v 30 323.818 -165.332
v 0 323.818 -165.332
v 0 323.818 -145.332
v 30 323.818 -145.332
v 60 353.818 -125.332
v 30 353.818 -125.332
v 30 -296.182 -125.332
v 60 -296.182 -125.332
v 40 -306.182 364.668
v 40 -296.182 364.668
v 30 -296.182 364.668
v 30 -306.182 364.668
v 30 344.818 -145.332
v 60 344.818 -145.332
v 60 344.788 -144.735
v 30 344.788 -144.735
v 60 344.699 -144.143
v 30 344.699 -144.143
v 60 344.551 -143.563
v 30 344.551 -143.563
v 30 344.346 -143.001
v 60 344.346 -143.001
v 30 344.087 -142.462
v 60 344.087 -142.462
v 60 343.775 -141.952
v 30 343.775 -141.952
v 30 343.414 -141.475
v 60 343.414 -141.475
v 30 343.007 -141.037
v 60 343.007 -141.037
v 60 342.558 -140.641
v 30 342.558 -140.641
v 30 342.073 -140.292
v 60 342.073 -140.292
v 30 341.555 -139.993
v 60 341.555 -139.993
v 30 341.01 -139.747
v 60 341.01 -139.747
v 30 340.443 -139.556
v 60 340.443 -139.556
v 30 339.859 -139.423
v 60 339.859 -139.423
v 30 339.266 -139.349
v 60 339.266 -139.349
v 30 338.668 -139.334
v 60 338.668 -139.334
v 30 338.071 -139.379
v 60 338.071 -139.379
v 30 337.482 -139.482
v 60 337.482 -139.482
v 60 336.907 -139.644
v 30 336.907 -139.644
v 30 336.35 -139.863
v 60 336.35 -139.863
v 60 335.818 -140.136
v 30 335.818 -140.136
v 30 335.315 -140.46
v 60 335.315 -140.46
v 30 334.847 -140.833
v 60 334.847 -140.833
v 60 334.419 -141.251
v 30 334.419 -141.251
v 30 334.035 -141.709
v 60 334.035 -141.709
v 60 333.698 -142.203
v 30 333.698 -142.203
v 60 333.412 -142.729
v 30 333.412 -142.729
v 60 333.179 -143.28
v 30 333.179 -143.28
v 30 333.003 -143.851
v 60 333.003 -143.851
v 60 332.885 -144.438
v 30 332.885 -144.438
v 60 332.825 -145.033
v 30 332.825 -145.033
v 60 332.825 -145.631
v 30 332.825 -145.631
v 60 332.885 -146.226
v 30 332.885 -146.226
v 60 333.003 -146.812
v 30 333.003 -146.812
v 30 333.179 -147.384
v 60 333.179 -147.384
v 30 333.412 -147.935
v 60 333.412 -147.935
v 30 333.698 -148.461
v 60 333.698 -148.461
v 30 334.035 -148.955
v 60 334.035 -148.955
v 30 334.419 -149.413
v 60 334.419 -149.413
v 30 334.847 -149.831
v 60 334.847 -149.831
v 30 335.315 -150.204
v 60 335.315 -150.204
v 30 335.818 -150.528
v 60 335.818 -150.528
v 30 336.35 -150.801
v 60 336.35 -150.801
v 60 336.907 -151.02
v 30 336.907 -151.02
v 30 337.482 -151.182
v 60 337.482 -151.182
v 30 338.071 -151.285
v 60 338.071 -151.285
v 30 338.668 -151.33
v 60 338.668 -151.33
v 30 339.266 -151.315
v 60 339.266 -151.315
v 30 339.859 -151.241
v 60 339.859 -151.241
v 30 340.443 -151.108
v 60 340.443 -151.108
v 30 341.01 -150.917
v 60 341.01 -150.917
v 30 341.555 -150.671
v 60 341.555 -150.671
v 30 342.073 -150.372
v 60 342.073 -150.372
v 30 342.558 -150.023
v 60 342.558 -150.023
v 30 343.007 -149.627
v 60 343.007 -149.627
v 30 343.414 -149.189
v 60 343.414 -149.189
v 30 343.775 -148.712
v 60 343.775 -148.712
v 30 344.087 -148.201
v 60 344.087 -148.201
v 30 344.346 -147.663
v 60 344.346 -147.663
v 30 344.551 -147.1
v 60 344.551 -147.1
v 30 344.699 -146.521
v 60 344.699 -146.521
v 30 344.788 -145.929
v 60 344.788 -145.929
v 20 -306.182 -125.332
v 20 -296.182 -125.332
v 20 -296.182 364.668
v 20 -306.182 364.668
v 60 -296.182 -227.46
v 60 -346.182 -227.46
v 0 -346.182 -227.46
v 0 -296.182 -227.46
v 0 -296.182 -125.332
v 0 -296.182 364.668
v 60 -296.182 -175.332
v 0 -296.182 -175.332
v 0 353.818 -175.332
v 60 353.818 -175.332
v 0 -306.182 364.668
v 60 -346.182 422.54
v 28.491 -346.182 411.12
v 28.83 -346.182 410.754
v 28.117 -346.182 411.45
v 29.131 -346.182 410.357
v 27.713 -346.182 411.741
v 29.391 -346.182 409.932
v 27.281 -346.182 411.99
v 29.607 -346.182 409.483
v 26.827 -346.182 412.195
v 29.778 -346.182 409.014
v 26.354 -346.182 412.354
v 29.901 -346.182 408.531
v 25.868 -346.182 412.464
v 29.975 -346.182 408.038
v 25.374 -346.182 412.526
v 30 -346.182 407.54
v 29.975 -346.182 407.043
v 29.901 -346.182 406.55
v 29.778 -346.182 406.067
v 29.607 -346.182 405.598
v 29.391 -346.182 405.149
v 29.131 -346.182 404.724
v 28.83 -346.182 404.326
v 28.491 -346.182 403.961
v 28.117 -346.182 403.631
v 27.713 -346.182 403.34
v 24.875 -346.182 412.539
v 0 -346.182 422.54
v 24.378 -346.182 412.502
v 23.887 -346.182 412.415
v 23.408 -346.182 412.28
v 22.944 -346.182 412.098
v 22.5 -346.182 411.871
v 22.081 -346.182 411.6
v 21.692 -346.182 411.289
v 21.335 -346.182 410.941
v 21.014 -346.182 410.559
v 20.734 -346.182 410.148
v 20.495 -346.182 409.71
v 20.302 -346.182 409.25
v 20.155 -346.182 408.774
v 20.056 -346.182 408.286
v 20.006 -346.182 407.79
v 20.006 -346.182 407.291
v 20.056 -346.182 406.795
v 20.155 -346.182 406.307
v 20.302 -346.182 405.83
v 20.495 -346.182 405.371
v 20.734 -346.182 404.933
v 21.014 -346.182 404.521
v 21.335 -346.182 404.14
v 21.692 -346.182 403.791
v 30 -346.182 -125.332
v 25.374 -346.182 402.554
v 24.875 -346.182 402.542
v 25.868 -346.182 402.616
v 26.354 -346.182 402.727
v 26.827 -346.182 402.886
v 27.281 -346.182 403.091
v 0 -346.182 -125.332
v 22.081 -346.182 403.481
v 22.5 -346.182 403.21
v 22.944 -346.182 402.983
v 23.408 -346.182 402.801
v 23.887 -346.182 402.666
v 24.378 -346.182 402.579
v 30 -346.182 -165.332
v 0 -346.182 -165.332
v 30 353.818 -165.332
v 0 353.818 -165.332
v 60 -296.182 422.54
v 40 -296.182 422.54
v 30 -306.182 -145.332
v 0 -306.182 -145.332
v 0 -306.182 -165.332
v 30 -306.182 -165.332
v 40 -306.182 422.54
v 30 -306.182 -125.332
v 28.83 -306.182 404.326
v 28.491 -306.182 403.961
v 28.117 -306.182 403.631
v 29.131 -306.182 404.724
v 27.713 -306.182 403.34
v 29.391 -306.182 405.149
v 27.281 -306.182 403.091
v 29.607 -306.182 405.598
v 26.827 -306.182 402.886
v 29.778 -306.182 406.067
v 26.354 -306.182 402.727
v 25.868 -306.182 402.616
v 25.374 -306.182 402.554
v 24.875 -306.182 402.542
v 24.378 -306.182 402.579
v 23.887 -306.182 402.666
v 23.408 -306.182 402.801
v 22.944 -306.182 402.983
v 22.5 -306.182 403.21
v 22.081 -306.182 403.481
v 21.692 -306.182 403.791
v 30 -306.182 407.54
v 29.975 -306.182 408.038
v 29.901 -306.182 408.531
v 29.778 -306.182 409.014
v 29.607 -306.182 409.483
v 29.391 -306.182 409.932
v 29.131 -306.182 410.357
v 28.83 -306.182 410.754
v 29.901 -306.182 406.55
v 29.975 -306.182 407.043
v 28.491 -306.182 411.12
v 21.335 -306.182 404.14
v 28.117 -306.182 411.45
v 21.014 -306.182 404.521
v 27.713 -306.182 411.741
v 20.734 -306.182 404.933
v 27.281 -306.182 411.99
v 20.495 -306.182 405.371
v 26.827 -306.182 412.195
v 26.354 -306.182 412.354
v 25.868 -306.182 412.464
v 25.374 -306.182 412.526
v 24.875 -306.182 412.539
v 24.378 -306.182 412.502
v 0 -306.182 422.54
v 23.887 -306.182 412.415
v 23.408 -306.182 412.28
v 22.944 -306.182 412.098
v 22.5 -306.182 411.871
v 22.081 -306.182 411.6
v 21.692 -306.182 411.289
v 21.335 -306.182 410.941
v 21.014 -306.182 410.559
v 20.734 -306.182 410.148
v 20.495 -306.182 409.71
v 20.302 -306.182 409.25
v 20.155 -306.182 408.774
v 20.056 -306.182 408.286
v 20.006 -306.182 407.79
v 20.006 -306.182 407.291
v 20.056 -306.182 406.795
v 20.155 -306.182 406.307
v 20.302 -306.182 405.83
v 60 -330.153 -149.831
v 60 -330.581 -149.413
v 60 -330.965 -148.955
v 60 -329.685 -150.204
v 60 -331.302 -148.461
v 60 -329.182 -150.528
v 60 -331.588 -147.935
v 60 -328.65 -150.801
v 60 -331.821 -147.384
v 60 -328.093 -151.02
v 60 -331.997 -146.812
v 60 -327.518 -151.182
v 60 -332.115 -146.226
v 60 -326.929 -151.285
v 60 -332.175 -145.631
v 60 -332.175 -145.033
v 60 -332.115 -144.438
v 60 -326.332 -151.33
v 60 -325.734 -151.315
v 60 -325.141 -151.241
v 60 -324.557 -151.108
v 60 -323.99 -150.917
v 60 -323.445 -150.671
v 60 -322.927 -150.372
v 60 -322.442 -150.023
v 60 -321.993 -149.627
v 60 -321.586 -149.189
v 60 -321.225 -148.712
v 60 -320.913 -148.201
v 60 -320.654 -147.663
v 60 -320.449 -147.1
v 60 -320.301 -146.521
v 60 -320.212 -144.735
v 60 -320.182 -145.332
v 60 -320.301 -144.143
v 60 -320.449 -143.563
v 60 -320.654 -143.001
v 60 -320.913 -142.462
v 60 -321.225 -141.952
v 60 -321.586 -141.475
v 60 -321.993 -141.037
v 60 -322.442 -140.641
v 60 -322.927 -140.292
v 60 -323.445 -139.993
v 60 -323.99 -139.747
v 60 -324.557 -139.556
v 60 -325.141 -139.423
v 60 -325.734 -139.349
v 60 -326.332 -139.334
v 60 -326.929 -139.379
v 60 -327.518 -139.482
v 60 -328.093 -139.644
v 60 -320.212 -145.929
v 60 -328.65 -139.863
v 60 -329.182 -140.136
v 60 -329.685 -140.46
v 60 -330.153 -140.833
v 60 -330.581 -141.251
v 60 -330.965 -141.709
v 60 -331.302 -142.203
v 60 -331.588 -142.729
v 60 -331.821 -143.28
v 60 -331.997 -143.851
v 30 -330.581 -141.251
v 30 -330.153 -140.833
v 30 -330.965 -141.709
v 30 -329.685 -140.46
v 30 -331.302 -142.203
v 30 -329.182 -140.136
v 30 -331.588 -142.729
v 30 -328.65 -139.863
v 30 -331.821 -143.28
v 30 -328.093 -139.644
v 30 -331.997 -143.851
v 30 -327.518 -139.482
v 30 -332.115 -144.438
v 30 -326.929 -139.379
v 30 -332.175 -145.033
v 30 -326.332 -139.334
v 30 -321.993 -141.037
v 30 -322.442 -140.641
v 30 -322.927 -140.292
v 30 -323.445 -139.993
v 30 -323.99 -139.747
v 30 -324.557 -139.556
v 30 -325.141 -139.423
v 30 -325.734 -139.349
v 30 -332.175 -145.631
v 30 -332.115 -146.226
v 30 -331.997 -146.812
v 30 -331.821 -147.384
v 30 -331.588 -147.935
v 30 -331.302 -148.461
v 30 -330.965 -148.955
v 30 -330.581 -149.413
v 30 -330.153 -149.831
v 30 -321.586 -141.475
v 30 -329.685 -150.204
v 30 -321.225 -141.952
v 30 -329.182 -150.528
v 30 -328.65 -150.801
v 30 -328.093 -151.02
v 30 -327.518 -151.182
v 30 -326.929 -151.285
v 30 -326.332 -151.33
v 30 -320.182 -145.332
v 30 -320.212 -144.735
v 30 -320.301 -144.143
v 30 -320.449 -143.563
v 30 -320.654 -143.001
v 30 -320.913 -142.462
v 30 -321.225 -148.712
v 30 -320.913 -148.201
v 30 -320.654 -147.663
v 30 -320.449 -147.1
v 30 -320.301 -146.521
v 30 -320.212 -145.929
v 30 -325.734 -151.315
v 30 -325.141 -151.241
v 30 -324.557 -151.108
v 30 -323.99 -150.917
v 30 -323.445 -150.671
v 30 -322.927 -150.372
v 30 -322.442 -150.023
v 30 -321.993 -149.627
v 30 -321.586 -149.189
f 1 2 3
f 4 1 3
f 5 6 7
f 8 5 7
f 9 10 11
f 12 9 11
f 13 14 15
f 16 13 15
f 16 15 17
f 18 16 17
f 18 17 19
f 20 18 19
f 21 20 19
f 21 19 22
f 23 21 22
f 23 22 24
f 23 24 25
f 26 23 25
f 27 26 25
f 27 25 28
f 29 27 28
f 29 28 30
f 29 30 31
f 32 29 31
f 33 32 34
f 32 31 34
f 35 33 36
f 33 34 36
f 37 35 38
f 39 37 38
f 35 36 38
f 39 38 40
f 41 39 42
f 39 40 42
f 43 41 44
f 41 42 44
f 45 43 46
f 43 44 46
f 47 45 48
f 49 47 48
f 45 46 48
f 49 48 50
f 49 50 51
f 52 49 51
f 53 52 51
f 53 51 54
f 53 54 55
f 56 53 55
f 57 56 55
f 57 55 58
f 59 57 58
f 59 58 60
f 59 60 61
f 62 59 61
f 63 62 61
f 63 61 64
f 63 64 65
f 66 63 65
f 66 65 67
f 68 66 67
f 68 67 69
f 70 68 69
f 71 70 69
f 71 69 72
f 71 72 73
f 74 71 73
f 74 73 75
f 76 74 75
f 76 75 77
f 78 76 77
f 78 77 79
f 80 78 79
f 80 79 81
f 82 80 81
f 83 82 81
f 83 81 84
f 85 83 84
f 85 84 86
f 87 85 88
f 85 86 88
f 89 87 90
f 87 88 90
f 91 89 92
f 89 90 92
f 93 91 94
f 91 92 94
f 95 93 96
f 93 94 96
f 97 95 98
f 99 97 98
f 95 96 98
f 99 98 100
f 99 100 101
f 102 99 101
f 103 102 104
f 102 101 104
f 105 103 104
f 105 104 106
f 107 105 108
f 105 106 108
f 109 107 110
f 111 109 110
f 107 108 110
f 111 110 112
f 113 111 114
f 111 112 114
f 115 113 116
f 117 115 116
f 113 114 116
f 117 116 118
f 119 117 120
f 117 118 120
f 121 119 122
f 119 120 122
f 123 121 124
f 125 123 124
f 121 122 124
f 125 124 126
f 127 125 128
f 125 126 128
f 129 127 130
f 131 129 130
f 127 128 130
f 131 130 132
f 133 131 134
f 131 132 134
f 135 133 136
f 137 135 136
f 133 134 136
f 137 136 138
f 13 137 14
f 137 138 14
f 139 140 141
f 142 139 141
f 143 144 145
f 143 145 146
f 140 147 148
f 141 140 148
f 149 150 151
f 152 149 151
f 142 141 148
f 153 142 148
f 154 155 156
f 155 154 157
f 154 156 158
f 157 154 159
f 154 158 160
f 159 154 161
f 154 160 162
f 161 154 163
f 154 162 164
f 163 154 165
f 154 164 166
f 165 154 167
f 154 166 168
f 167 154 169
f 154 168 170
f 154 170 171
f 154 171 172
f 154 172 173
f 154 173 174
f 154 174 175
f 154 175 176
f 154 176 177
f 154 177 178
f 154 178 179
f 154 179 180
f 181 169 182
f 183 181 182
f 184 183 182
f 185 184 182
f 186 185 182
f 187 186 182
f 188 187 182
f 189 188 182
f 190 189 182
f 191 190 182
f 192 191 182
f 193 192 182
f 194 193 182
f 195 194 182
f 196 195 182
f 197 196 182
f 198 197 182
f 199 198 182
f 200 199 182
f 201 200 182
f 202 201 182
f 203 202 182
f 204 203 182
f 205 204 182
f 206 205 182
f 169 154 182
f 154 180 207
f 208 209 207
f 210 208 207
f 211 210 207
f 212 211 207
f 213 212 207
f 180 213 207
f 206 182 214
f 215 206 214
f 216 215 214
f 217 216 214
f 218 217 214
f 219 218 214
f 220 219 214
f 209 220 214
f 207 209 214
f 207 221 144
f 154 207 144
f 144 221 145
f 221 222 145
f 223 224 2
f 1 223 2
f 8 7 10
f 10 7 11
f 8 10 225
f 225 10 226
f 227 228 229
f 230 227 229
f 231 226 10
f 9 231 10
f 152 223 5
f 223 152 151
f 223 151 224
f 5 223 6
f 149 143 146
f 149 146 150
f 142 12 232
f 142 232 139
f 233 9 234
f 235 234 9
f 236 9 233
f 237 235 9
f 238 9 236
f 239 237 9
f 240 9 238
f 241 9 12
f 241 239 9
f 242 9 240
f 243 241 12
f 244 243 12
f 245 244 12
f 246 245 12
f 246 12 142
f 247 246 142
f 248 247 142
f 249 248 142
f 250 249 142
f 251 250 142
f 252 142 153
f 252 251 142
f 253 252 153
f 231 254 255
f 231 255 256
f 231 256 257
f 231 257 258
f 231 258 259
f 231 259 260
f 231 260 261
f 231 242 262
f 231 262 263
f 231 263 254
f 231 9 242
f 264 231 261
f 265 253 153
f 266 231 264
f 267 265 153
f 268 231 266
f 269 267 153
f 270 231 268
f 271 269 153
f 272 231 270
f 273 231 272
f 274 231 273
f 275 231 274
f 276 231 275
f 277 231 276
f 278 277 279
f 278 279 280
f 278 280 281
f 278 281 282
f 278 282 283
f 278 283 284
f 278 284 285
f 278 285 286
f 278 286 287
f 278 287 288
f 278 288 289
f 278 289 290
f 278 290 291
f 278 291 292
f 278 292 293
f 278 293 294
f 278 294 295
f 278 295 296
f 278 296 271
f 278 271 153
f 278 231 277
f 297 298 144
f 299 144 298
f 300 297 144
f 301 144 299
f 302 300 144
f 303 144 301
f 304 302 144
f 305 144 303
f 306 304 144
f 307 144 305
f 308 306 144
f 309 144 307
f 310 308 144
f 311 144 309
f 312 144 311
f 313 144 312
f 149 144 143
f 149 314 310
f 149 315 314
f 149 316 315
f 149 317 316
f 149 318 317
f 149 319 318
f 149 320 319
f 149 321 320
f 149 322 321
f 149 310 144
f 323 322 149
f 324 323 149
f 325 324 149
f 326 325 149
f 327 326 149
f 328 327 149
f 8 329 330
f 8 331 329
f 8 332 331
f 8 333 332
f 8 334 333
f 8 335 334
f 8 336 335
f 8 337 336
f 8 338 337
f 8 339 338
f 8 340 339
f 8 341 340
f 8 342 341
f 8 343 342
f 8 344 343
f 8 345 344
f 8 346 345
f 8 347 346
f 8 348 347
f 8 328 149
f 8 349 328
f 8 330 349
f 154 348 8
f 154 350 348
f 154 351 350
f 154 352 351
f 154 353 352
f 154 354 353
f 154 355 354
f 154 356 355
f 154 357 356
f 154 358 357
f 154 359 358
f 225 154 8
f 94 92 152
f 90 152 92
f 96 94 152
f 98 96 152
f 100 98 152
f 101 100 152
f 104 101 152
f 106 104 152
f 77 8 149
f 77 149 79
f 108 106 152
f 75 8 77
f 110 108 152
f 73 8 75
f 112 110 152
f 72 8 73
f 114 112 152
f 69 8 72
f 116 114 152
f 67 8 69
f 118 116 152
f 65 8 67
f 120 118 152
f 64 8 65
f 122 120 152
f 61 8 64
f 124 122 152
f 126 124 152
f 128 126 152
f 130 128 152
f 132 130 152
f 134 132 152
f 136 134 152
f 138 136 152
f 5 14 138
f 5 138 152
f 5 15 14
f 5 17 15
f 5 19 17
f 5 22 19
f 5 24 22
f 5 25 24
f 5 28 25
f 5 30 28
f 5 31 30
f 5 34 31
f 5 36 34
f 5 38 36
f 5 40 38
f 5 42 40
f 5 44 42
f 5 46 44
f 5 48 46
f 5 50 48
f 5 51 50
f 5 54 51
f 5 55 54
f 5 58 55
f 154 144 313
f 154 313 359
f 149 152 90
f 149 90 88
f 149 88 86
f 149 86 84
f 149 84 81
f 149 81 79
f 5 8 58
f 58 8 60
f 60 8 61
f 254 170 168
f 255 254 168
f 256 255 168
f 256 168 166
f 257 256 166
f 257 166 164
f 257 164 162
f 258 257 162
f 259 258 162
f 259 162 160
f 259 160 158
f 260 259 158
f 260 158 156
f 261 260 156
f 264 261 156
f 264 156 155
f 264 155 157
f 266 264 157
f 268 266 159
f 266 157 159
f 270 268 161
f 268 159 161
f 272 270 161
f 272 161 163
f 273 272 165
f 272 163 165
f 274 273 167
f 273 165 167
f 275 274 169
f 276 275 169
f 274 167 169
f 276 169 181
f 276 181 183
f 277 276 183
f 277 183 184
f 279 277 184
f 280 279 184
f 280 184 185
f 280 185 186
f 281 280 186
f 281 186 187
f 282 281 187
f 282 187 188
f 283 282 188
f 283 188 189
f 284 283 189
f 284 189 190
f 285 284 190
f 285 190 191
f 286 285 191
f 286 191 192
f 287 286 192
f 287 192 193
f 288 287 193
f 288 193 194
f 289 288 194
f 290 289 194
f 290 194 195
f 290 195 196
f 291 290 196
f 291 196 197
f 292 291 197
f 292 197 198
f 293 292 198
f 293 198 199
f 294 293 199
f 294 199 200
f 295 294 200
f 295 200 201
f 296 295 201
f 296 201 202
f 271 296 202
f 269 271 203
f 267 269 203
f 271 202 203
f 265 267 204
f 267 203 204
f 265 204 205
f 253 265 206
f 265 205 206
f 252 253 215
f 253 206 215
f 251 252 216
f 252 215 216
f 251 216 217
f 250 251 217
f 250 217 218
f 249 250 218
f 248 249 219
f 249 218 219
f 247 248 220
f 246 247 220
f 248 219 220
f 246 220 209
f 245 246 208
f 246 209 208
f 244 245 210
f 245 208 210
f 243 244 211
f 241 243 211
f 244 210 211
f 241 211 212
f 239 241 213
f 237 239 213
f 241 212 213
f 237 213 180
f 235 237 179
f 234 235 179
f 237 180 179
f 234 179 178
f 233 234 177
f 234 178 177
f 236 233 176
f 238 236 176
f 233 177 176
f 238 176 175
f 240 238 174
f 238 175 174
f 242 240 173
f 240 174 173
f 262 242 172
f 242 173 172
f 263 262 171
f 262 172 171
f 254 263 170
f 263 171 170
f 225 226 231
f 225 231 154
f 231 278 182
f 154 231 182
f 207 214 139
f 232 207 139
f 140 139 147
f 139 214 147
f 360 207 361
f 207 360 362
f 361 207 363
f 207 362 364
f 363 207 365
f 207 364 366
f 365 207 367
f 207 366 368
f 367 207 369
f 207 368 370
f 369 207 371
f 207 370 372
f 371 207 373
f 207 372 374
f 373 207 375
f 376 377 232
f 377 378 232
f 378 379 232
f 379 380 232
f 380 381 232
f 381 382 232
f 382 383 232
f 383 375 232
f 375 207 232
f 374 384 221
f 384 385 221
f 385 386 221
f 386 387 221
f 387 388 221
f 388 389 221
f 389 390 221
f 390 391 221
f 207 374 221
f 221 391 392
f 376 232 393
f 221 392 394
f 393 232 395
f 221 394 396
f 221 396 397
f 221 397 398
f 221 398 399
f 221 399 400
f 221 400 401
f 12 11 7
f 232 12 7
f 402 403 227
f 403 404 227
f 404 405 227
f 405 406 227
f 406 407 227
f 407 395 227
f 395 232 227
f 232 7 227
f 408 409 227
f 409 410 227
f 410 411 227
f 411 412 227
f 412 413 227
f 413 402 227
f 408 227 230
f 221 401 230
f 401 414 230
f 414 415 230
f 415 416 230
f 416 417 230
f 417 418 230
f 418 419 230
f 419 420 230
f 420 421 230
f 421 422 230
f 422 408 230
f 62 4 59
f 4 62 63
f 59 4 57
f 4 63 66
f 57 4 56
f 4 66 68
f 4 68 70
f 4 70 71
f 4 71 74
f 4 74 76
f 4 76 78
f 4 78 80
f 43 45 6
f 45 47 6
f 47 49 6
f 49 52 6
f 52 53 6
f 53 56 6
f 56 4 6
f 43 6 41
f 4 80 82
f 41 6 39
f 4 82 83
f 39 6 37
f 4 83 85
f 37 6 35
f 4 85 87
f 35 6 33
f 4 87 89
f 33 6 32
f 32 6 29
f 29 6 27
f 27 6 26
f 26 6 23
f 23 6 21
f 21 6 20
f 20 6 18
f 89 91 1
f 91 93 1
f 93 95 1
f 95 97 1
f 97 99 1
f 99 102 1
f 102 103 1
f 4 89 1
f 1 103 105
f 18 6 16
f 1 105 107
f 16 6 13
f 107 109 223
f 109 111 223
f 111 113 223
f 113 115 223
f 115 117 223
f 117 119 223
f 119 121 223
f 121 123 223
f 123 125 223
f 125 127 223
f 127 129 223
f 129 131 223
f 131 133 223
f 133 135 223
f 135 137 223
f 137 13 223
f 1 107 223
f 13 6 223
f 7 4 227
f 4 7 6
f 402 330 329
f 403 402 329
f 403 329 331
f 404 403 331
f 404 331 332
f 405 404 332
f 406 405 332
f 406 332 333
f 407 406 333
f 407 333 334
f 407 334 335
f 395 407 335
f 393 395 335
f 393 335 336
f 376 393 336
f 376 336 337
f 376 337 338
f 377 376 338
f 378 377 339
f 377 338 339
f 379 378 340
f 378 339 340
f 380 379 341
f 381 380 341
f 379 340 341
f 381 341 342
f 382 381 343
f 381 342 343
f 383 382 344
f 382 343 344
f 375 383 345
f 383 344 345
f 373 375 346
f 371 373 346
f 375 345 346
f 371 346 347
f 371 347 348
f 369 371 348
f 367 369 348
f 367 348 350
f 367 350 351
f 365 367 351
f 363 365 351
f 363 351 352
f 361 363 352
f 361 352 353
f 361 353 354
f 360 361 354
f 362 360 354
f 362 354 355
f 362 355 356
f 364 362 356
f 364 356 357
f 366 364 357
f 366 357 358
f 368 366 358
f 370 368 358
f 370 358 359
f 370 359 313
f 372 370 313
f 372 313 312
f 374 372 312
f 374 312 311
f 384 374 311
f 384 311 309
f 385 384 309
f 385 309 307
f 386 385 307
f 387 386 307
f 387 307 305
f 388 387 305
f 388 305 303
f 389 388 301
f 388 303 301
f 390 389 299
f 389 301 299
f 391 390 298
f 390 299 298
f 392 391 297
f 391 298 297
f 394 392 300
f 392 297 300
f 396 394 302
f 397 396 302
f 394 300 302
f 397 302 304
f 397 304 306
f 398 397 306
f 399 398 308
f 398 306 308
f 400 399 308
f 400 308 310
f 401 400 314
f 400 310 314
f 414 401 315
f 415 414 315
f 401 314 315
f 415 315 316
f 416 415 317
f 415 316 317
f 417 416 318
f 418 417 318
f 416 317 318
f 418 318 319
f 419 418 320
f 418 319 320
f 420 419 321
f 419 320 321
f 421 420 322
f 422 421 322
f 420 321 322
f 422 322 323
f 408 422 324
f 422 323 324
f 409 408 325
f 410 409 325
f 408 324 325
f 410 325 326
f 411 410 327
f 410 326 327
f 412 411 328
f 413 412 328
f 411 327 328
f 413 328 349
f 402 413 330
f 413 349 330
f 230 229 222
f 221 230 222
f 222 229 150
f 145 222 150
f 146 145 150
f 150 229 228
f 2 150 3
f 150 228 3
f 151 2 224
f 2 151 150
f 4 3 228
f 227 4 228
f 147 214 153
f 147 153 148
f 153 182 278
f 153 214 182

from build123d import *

# Parameters (mm, degrees)
F1_DEPTH = 60
F3_DEPTH = 30
F5_D     = 12
F7_DEPTH = 10
F9_D     = 10


with BuildPart() as f1:
    # F0 (on Right) → F1 (new body)
    with BuildSketch(Plane.YZ):
        Polygon((-296.18248, 422.540385), (-346.18248, 422.540385), (-346.18248, -227.459615), (-296.18248, -227.459615), (-296.18248, -175.331955), (353.81752, -175.331955), (353.81752, -125.331955), (-296.18248, -125.331955), align=None)
    extrude(amount=F1_DEPTH)

    # F2 (on face) → F3 (cut)
    with BuildSketch(Plane(origin=(0, 0, 0), x_dir=(0, -1, 0), z_dir=(-1, 0, 0))):
        Polygon((346.18248, -125.331955), (-353.81752, -125.331955), (-353.81752, -165.331955), (-323.81752, -165.331955), (-323.81752, -145.331955), (306.18248, -145.331955), (306.18248, -165.331955), (346.18248, -165.331955), align=None)
    extrude(amount=-F3_DEPTH, mode=Mode.SUBTRACT)

    # F5 (through all)
    with Locations(Plane(origin=(30, 0, 0), x_dir=(0, -1, 0), z_dir=(-1, 0, 0))):
        with Locations((-338.81752, -145.331955), (326.18248, -145.331955)):
            Hole(F5_D / 2)

    # F6 (on face) → F7 (cut)
    with BuildSketch(Plane(origin=(0, -296.18248, 0), x_dir=(-1, 0, 0), z_dir=(0, 1, 0))):
        Polygon((-30, 364.668045), (-30, -125.331955), (-20, -125.331955), (-20, 364.668045), (0, 364.668045), (0, 374.668045), (0, 422.540385), (-40, 422.540385), (-40, 364.668045), align=None)
    extrude(amount=-F7_DEPTH, mode=Mode.SUBTRACT)

    # F9 (through all)
    with Locations(Plane(origin=(0, -306.18248, 0), x_dir=(-1, 0, 0), z_dir=(0, 1, 0))):
        with Locations((-25, 407.540385)):
            Hole(F9_D / 2)


solid = f1.part
